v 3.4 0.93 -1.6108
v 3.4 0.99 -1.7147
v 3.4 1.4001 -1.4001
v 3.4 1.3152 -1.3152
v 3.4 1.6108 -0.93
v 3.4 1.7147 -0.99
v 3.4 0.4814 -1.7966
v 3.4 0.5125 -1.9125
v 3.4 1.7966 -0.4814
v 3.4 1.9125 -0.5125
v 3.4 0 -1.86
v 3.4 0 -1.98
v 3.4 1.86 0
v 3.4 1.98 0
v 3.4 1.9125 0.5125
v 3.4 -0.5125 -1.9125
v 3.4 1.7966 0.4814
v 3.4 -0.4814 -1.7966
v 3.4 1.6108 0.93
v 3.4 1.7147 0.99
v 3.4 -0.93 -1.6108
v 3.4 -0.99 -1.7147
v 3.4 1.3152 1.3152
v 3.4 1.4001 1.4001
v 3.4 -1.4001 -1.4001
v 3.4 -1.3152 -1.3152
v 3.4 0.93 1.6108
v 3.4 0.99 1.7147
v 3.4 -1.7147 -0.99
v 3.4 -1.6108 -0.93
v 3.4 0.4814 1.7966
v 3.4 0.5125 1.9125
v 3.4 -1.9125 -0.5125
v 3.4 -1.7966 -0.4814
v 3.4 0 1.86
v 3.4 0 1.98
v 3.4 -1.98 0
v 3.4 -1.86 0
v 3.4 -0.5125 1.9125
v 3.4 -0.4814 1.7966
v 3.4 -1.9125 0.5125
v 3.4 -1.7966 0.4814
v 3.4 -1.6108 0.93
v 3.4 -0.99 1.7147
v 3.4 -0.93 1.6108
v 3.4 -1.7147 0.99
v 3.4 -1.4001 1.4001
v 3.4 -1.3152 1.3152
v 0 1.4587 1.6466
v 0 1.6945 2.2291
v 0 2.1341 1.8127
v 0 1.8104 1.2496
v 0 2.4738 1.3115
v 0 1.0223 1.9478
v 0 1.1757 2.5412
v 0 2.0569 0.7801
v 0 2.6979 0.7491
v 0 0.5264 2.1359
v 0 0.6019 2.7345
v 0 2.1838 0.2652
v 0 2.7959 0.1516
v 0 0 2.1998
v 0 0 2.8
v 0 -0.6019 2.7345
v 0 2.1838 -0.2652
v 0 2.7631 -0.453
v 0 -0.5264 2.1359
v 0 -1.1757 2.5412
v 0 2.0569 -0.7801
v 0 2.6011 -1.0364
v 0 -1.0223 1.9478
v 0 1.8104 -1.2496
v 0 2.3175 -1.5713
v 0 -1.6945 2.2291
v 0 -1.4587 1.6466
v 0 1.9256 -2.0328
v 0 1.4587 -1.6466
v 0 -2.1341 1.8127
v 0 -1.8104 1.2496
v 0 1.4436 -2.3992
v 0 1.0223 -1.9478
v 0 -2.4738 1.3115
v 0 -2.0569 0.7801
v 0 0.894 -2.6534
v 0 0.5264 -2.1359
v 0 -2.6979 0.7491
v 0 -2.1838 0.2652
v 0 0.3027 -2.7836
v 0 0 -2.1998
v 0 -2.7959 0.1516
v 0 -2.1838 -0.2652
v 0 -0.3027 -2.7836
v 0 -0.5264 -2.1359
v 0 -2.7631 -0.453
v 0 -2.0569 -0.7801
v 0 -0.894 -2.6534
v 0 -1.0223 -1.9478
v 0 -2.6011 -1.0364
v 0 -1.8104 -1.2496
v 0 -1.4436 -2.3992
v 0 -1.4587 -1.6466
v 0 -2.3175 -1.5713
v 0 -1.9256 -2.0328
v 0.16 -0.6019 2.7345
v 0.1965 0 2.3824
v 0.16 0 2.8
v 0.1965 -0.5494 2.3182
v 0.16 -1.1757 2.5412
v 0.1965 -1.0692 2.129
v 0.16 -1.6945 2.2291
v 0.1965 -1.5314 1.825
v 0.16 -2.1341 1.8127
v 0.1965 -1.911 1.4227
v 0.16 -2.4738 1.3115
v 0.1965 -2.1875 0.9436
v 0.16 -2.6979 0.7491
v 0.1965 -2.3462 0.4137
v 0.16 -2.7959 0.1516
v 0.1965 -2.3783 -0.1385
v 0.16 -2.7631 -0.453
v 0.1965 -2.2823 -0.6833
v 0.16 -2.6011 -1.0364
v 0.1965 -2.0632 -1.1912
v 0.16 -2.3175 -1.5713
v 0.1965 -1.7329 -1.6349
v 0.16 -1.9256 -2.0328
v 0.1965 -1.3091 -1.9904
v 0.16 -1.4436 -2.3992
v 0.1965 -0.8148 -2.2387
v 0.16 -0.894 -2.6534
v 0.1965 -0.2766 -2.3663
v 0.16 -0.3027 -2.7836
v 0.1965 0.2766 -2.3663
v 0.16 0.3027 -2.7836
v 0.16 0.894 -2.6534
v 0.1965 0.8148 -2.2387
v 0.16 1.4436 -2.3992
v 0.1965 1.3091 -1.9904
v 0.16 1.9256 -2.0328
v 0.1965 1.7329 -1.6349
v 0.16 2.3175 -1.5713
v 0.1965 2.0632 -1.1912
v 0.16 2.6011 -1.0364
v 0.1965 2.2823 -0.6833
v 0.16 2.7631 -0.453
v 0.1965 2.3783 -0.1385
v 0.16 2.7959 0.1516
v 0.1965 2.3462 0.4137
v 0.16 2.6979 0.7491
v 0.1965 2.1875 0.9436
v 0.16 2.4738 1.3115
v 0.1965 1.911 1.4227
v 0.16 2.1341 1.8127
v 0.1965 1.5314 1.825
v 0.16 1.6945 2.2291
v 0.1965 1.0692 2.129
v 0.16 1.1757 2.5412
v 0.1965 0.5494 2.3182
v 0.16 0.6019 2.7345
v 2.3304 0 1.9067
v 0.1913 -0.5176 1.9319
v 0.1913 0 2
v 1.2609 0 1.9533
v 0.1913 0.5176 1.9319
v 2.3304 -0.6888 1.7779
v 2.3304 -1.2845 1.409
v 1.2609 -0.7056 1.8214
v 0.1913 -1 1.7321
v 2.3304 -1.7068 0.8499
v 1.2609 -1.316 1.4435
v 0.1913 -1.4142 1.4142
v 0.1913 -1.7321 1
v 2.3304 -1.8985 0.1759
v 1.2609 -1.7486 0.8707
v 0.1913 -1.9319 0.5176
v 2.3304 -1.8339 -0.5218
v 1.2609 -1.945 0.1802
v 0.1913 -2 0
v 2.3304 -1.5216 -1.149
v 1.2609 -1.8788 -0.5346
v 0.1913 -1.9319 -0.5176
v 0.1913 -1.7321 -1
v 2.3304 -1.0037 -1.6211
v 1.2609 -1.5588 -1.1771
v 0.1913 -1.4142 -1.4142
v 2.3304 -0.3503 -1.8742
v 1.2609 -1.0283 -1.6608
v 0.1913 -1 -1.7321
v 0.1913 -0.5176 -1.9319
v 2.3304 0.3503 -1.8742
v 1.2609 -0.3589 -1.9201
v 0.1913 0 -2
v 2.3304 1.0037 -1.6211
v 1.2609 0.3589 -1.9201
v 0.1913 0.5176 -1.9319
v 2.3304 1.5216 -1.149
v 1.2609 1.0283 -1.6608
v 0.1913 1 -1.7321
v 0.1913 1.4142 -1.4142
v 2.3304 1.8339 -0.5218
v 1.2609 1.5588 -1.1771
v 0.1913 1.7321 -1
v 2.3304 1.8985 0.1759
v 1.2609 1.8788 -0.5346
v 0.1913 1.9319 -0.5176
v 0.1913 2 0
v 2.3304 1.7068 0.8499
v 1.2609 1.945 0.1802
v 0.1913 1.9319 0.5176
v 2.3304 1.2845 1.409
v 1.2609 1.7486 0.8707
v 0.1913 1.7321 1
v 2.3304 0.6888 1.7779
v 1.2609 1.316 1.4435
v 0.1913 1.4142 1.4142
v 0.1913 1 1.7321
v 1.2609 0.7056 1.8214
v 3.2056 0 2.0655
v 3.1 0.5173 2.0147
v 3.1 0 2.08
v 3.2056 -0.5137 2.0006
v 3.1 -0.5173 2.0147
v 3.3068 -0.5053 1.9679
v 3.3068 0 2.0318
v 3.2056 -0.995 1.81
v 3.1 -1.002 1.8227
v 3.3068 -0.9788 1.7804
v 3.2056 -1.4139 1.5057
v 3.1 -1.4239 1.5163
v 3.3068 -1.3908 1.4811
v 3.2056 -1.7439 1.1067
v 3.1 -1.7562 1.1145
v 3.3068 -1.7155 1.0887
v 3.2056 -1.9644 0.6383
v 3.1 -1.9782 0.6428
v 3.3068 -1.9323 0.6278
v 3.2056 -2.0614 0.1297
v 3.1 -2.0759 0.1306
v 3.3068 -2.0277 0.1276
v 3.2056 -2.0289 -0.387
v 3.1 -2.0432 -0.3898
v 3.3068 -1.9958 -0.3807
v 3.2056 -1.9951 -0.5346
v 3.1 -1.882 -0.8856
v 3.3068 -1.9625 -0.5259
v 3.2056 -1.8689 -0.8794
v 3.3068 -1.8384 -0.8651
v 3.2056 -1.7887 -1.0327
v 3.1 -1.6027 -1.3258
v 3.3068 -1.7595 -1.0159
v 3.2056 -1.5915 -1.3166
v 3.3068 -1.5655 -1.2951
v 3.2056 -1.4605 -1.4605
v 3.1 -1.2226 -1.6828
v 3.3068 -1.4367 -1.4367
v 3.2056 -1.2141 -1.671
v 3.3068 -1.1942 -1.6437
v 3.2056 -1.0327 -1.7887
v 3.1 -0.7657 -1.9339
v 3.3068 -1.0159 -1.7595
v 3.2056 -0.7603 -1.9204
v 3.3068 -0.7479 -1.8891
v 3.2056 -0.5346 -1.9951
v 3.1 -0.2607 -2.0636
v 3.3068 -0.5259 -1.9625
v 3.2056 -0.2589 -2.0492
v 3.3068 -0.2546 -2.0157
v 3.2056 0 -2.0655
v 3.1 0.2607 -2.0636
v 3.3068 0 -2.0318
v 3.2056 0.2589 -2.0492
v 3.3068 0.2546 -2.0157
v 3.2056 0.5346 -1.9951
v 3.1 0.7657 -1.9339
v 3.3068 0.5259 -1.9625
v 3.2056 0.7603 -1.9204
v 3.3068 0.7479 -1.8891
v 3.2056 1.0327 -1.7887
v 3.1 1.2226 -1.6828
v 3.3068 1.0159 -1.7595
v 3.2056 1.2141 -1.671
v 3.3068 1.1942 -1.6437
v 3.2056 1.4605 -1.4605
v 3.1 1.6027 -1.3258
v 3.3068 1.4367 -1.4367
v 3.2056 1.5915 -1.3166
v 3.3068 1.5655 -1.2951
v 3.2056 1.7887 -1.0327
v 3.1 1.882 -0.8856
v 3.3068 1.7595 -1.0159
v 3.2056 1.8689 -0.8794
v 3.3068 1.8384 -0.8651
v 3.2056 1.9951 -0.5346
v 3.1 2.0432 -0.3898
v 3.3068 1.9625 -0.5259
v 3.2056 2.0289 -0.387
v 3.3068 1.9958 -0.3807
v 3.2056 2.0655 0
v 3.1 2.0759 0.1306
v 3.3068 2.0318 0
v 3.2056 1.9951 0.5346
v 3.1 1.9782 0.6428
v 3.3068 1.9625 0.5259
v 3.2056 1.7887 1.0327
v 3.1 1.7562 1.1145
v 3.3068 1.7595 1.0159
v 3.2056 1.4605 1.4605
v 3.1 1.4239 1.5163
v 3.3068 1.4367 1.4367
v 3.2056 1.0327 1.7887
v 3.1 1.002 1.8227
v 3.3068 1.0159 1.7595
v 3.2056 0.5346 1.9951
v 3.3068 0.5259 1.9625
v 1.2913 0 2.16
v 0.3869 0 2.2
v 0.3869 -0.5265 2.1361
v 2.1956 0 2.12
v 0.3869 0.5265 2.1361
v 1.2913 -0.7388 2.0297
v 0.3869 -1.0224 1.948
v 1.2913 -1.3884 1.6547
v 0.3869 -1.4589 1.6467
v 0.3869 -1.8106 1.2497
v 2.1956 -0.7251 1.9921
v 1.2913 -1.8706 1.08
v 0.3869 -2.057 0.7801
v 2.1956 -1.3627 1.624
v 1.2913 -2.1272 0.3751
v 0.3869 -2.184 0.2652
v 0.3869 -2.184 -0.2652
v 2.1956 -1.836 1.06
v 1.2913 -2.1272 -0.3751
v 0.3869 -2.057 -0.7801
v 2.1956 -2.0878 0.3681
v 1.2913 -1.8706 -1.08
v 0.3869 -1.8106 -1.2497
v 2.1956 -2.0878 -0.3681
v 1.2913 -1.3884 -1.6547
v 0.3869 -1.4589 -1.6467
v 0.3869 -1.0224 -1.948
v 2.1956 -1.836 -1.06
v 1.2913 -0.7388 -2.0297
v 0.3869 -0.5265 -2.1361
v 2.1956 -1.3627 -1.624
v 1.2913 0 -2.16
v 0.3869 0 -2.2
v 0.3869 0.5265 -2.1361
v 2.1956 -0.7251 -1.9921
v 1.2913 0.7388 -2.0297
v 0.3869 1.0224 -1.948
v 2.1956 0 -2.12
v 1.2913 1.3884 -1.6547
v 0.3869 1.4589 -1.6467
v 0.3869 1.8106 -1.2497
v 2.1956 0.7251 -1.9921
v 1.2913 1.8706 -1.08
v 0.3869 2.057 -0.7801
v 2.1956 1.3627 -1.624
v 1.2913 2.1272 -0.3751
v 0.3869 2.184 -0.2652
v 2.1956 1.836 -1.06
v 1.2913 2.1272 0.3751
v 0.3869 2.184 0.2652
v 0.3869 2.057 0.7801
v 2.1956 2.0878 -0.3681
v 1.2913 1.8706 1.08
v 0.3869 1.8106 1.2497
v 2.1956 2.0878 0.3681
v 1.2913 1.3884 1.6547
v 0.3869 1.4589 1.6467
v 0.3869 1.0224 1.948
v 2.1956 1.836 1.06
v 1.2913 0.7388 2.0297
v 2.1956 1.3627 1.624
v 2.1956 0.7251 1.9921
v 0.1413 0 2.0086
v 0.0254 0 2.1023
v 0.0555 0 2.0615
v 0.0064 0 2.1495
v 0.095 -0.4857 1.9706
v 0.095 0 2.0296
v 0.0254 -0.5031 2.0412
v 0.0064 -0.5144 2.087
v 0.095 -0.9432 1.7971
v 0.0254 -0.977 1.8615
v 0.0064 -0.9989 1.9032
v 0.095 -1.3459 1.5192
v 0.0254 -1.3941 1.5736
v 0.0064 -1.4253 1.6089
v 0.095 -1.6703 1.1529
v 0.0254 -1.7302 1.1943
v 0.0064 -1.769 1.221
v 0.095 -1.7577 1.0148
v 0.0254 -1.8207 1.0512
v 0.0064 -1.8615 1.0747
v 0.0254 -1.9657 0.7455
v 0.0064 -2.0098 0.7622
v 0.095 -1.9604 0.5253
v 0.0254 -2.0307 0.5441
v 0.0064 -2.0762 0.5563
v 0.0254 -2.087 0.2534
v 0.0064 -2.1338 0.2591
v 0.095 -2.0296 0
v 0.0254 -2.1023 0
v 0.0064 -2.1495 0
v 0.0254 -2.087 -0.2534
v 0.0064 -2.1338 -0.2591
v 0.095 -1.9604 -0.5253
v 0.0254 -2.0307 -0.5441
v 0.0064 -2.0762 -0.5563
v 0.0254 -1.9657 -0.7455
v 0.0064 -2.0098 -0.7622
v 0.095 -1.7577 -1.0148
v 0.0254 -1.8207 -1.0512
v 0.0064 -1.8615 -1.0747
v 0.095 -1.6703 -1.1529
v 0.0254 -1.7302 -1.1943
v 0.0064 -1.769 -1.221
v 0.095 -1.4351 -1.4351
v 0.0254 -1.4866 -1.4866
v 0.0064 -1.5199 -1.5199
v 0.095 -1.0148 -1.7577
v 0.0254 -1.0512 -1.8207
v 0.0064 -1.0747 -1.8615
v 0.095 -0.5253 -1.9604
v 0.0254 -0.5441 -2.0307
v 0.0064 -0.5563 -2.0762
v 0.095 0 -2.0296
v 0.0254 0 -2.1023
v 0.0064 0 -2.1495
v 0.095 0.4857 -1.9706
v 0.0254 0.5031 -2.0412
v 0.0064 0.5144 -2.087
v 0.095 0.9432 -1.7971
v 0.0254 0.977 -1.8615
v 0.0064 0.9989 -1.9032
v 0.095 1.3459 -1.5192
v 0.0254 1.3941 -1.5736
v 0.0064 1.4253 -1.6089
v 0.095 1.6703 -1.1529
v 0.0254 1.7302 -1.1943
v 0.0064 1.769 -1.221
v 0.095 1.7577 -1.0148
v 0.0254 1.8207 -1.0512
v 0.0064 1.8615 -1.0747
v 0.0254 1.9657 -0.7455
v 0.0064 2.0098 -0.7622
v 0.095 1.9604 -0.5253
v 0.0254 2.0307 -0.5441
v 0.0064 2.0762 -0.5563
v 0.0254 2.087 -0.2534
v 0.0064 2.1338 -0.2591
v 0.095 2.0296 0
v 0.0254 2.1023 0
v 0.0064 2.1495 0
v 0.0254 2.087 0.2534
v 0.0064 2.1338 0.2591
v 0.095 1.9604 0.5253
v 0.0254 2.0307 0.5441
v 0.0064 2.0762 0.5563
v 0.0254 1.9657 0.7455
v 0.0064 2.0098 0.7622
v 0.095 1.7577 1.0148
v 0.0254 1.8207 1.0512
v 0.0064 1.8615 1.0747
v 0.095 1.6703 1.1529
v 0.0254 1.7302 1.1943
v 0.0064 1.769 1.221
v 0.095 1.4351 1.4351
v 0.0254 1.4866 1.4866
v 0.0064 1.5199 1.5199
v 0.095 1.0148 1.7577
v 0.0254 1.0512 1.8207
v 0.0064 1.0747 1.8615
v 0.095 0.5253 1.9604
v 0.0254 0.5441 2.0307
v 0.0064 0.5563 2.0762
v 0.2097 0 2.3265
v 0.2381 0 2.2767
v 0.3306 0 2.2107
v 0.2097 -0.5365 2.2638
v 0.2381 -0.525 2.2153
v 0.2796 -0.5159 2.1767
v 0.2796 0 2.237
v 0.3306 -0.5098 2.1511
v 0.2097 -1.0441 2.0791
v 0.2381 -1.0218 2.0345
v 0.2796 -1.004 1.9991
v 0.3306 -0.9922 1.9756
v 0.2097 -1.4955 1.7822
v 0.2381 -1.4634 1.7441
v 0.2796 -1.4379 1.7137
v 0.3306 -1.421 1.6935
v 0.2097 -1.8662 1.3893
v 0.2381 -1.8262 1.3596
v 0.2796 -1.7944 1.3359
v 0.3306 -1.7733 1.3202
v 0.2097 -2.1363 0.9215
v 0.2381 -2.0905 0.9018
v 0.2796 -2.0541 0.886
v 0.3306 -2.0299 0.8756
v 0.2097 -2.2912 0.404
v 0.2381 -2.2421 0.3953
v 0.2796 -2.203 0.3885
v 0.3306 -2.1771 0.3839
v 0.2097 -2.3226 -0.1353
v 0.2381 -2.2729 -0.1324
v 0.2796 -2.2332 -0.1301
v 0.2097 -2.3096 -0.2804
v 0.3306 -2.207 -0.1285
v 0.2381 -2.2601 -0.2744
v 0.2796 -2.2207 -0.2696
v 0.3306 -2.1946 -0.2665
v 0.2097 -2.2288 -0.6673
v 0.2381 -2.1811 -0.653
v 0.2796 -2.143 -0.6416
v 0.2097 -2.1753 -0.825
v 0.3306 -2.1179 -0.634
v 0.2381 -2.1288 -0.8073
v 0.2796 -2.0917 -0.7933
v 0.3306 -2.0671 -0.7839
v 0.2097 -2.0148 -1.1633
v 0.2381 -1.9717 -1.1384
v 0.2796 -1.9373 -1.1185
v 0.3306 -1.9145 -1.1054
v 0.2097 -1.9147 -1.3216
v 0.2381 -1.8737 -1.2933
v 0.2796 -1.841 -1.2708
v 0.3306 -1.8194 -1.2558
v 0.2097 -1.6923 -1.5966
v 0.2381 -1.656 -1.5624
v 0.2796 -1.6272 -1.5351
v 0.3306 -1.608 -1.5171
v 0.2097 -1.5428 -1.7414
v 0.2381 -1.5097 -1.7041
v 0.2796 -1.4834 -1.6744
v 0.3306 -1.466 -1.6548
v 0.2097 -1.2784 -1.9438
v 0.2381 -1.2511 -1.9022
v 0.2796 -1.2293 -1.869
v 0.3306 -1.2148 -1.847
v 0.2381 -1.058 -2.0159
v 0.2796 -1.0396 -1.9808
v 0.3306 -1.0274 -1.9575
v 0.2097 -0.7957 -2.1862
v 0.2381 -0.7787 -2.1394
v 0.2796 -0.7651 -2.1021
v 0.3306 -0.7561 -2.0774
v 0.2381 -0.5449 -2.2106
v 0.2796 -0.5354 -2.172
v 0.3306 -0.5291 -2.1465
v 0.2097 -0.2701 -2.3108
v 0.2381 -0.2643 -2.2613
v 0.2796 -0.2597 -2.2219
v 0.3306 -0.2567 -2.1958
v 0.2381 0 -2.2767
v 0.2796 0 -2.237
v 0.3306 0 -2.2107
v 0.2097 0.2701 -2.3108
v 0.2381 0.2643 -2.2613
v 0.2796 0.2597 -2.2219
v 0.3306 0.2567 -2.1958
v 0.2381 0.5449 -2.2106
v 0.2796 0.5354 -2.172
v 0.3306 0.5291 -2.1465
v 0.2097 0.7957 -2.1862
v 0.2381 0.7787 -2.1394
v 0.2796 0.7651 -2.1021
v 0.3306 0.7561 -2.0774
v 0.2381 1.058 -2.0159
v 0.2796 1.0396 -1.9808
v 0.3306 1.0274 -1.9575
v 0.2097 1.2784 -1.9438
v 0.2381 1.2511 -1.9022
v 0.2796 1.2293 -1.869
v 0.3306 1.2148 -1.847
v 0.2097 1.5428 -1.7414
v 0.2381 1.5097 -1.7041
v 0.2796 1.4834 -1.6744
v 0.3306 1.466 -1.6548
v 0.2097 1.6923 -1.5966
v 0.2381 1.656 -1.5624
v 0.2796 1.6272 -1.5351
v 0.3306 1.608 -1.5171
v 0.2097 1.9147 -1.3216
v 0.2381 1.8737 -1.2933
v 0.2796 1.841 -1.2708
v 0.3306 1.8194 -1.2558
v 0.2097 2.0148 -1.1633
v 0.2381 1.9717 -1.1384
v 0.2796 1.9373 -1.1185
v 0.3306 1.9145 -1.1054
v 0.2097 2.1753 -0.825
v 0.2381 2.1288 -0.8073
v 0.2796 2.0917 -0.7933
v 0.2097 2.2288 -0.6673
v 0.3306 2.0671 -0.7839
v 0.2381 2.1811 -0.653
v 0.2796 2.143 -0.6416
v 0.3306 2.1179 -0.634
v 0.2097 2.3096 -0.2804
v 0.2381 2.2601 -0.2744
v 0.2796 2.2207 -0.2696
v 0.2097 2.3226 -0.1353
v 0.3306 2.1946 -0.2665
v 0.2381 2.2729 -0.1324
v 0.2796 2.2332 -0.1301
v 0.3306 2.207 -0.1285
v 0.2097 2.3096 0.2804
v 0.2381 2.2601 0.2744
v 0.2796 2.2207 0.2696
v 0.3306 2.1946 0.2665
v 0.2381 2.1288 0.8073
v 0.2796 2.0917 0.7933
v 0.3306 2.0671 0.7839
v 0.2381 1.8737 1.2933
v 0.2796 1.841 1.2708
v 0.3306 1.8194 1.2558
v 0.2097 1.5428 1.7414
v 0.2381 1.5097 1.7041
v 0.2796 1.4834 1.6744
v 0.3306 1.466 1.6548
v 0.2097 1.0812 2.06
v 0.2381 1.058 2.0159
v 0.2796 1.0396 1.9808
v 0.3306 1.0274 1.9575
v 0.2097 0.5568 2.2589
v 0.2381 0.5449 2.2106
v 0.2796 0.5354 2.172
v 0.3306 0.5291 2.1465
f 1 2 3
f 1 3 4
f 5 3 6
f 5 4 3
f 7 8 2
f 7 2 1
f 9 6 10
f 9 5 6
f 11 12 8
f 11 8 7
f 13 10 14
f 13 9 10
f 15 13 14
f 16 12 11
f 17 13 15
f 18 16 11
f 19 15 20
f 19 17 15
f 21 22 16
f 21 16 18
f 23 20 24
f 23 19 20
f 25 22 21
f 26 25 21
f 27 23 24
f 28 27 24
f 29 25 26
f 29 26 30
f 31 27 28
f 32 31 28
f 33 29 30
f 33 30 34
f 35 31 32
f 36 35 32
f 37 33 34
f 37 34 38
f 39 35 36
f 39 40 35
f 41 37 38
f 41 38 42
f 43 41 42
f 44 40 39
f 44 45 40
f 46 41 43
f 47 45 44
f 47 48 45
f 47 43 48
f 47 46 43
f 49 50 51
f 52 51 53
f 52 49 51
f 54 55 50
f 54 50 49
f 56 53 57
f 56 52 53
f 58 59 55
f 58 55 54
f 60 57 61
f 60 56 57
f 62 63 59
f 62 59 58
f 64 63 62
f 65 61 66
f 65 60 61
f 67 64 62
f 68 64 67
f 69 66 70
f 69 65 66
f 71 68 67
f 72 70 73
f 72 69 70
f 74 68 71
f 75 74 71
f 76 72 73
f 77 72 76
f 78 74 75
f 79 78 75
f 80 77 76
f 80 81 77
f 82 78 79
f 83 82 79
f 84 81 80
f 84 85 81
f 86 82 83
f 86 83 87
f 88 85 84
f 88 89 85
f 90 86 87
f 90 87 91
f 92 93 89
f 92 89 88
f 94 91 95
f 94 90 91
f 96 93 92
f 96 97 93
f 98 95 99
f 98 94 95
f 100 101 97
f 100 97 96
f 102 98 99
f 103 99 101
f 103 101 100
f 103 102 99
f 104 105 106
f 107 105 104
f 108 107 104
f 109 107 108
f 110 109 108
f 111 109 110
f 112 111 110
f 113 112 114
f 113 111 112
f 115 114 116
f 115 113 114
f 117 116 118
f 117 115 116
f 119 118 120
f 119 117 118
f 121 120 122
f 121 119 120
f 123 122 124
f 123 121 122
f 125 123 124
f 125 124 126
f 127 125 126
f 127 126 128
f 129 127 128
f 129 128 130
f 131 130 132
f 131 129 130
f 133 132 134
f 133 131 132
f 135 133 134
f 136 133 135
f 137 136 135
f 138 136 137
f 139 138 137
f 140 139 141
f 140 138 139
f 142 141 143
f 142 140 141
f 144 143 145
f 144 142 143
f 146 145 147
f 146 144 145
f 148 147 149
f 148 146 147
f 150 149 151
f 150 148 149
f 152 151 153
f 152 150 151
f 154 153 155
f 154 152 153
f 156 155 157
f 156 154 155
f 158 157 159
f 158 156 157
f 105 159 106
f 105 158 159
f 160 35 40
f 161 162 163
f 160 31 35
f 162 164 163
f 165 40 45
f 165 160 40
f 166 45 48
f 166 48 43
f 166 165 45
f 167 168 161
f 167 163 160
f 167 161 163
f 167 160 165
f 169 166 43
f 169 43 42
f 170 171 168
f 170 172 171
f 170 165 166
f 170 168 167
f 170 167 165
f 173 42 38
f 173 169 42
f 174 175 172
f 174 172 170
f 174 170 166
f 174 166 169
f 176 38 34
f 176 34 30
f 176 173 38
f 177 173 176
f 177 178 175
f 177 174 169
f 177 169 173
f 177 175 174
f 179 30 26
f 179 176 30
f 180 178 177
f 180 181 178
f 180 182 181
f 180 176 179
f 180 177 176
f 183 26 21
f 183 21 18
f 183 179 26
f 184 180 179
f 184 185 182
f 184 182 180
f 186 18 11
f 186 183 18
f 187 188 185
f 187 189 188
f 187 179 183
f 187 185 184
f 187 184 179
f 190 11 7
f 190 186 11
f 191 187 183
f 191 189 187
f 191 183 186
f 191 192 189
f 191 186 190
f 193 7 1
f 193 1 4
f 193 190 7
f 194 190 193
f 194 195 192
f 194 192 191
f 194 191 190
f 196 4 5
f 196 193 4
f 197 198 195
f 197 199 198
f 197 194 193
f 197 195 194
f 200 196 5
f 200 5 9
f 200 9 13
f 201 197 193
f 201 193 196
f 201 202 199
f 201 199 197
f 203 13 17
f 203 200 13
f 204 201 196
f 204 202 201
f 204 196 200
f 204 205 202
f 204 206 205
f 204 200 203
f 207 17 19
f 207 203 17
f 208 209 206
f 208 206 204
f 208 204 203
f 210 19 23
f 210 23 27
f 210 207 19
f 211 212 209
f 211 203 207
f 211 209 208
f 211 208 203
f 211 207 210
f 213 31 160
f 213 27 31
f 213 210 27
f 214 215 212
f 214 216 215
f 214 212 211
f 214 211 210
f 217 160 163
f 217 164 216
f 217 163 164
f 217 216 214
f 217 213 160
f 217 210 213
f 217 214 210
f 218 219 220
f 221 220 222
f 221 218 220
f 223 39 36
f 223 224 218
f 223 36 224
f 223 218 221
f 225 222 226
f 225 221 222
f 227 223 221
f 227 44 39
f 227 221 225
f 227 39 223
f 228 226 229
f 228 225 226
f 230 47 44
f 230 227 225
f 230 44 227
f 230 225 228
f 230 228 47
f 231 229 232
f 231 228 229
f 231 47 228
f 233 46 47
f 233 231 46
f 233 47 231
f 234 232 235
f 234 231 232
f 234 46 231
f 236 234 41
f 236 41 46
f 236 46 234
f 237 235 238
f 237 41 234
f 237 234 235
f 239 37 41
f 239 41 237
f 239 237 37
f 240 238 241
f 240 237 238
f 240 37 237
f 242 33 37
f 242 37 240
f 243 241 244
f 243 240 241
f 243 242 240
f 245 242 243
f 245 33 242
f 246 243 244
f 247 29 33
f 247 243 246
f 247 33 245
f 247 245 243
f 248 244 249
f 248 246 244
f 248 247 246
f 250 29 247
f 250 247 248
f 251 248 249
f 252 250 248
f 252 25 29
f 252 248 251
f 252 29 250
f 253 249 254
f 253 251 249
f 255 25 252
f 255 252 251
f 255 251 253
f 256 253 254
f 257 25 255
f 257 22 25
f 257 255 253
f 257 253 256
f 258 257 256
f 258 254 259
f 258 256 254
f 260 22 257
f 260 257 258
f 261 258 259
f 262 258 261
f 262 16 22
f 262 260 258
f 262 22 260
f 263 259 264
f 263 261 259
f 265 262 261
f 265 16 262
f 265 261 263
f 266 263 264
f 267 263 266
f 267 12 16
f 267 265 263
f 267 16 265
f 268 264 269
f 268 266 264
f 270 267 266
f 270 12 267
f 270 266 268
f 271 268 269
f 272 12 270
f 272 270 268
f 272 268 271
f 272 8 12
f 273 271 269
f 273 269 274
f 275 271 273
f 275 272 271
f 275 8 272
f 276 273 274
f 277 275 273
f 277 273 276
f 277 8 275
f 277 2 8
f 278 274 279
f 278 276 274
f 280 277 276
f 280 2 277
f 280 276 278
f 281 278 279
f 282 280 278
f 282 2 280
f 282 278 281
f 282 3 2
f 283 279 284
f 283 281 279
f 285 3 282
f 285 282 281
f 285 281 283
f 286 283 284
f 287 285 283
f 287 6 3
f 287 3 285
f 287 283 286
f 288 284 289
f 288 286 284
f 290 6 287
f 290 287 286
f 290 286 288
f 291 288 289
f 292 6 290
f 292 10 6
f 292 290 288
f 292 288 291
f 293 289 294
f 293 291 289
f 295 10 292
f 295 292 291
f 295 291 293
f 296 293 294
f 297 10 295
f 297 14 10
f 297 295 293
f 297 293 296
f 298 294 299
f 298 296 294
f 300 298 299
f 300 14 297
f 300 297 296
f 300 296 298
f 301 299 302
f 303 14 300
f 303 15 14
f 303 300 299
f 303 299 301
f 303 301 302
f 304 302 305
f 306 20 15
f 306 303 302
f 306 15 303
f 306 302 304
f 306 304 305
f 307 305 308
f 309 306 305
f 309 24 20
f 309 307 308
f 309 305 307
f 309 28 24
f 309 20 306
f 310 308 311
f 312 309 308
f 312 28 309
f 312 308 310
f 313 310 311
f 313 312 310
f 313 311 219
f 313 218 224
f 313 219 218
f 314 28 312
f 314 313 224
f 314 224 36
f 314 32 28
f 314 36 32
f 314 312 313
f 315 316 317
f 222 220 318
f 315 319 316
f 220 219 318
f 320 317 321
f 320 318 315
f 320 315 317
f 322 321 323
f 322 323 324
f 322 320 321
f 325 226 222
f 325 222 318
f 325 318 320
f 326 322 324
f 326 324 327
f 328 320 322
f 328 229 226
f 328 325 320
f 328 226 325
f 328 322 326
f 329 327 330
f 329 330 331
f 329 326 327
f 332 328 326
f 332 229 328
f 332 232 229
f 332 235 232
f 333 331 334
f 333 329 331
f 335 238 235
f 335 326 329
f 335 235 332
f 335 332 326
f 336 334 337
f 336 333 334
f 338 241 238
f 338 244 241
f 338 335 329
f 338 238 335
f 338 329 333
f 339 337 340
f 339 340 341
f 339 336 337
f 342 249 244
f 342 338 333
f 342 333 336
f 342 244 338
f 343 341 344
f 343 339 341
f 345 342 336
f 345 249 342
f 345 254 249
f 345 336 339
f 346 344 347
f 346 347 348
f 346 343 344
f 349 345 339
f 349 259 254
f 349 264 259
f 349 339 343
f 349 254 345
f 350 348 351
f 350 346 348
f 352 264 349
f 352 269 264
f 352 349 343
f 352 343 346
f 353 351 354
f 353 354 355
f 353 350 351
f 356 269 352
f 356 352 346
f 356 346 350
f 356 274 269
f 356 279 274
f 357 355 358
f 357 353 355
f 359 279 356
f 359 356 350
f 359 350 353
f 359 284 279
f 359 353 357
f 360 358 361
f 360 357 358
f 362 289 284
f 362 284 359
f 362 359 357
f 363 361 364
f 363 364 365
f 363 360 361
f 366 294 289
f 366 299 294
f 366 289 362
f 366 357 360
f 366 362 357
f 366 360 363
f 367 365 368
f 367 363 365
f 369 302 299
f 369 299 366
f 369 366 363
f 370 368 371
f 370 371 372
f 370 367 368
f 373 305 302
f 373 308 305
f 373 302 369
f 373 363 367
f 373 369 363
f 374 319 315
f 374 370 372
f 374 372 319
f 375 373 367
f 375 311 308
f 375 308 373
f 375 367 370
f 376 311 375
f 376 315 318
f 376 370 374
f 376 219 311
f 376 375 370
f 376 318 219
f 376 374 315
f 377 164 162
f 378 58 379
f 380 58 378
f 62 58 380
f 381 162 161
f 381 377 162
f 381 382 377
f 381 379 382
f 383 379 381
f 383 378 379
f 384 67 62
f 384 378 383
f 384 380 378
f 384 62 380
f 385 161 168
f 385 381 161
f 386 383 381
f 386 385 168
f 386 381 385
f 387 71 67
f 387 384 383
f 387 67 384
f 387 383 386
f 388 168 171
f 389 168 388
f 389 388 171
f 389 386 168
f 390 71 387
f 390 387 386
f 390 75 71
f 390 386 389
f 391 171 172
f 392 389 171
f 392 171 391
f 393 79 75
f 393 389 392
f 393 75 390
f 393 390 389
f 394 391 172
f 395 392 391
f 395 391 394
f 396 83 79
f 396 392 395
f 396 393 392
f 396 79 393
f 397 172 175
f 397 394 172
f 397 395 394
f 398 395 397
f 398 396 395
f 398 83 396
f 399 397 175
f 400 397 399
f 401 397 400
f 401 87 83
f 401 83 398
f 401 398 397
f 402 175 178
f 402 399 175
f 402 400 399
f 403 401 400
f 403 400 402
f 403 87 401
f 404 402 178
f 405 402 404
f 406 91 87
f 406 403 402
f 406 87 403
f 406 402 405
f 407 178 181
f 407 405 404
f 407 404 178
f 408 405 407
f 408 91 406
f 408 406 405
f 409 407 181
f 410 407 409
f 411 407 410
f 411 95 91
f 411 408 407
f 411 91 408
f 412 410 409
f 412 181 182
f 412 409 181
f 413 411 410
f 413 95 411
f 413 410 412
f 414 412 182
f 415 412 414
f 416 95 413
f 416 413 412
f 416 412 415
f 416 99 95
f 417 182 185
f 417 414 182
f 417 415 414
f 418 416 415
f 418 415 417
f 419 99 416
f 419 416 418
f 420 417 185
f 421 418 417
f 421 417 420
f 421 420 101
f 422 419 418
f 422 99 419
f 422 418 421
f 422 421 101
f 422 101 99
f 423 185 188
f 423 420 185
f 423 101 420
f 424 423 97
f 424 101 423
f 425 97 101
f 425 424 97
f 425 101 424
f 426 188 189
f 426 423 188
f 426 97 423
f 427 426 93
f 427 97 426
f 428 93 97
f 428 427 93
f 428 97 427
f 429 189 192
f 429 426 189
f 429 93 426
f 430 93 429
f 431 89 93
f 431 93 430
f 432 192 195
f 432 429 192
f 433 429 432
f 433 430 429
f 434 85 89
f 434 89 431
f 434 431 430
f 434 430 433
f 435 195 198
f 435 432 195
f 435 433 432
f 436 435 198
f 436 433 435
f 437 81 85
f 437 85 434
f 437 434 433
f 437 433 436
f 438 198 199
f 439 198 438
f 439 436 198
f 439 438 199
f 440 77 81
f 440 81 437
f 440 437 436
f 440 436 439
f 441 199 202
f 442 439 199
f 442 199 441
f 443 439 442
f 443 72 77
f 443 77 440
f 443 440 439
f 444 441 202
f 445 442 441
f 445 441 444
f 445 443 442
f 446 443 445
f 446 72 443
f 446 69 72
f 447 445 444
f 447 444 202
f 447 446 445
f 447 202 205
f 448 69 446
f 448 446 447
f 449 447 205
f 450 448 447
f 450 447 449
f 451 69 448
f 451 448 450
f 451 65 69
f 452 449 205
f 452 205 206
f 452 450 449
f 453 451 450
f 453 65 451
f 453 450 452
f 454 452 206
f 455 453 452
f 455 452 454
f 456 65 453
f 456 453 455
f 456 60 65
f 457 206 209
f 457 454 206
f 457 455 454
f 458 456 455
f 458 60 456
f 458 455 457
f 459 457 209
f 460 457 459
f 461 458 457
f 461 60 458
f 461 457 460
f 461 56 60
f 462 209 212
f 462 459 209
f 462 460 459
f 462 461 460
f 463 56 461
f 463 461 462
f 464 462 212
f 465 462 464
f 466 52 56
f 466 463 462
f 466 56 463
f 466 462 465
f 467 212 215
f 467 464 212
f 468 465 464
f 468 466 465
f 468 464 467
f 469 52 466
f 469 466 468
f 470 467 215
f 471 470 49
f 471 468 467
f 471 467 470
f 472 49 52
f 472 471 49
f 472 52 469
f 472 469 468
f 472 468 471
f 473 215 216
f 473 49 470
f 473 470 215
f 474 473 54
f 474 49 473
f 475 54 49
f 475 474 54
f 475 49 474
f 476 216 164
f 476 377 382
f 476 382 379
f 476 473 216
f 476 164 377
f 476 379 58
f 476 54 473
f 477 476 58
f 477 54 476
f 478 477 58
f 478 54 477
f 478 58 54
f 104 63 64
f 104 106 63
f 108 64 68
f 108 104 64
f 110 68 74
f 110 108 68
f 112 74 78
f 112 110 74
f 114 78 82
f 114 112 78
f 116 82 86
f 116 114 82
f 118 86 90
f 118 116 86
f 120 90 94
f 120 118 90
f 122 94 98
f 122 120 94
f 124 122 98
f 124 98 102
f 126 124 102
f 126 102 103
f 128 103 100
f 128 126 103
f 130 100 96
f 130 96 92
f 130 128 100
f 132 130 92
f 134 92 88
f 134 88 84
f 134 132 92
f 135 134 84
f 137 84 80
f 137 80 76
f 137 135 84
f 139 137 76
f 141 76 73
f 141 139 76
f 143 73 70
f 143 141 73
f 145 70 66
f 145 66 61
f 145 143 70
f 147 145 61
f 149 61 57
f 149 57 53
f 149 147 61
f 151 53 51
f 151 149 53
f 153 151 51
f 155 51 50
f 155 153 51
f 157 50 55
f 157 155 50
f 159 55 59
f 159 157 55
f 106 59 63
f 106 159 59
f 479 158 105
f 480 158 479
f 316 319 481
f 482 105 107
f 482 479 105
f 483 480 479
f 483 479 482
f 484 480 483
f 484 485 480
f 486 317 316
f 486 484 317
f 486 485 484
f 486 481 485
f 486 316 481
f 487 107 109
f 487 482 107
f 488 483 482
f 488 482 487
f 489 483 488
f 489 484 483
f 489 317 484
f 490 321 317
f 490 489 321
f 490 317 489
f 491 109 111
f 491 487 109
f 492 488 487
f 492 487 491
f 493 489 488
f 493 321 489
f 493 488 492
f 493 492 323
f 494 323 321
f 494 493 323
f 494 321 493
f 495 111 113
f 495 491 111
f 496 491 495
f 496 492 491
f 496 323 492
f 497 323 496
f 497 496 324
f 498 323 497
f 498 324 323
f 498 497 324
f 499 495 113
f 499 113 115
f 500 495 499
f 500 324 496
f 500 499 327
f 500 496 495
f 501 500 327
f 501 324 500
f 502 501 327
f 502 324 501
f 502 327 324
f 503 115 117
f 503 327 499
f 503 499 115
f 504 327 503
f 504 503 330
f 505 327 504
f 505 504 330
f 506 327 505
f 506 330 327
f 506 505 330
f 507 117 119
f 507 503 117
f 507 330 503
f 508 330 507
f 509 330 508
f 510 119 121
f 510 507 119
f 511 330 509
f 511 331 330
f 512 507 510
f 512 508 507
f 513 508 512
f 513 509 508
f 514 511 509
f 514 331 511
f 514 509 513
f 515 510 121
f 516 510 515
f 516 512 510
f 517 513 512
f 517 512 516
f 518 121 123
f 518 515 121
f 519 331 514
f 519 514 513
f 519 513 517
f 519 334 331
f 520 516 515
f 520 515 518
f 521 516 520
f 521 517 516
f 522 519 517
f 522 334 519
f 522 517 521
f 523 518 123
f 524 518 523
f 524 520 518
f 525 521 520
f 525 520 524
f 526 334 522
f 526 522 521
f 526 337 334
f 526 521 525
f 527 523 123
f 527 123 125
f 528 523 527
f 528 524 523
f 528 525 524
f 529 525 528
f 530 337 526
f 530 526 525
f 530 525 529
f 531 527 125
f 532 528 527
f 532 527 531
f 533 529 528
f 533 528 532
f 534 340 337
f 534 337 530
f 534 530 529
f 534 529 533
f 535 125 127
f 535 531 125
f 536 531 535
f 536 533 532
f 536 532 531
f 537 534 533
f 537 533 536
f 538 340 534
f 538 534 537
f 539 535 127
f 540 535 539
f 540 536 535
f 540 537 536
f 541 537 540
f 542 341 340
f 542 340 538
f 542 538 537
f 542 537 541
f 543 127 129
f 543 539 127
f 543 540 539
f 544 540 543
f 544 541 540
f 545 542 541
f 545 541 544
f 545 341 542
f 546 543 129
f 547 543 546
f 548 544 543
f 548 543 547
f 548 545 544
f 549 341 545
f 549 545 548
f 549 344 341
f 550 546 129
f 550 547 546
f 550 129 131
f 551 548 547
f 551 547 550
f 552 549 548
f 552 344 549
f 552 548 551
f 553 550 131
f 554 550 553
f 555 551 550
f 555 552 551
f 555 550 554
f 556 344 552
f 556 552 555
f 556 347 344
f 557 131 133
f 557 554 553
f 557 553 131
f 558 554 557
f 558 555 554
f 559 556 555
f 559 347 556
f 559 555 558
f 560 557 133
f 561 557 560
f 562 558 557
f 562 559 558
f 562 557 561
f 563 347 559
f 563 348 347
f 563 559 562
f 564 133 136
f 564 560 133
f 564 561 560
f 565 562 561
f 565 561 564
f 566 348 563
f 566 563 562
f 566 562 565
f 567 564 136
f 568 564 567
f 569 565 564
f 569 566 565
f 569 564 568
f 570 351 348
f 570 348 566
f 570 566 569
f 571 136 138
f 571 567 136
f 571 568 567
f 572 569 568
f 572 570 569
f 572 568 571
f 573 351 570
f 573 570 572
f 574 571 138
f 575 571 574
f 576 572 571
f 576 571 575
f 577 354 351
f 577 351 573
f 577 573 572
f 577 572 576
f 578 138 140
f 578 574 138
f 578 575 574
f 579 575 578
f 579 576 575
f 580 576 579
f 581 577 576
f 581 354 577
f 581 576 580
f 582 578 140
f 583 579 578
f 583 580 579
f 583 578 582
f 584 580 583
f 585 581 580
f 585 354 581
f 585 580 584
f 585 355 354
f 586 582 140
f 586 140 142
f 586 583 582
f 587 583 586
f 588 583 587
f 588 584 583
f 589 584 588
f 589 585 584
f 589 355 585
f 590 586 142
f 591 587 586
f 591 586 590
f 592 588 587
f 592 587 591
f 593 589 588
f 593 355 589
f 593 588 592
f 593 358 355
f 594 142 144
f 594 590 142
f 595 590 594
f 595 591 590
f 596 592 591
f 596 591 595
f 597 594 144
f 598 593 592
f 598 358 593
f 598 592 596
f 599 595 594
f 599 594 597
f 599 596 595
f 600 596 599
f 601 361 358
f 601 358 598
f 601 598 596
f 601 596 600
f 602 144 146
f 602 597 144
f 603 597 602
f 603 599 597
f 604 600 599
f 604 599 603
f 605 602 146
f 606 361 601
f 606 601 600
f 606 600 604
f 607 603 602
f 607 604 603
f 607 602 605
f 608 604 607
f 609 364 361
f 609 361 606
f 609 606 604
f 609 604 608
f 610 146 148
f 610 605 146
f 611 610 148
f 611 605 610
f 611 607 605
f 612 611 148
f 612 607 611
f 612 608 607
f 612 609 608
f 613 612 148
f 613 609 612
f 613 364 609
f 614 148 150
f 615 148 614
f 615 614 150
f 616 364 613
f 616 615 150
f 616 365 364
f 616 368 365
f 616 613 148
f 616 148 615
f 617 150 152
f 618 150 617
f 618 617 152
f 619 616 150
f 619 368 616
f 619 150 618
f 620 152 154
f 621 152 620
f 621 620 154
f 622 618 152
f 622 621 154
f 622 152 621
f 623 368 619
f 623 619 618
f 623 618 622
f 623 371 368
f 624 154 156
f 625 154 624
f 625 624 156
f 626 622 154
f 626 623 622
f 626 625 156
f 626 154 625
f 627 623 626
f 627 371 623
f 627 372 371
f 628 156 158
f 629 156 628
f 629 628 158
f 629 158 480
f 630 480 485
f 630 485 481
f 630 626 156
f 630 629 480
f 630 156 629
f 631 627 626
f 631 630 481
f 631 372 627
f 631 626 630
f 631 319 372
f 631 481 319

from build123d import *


with BuildPart() as part:
    # Esboço1 → Revolução1 (revolve)
    with BuildSketch(Plane.XY, mode=Mode.PRIVATE) as revolu_o1_sk:
        with BuildLine():
            Line((0, 2.199809904), (0, 2.8))
            Line((0, 2.8), (0.16, 2.8))
            Line((0.16, 2.8), (0.196537584, 2.382373504))
            ThreePointArc((0.196537584, 2.382373504), (0.257432856, 2.255371175), (0.386939067, 2.2))
            Line((0.386939067, 2.2), (3.1, 2.08))
            ThreePointArc((3.1, 2.08), (3.256983611, 2.050950832), (3.4, 1.98))
            Line((3.4, 1.98), (3.4, 1.86))
            Line((3.4, 1.86), (0.191282067, 2))
            ThreePointArc((0.191282067, 2), (0.055529265, 2.061505143), (0, 2.199809904))
        make_face()
    revolve(revolu_o1_sk.sketch.rotate(Axis((0, 0, 0), (1, 0, 0)), 90), axis=Axis((0, 0, 0), (1, 0, 0)))


solid = part.part
